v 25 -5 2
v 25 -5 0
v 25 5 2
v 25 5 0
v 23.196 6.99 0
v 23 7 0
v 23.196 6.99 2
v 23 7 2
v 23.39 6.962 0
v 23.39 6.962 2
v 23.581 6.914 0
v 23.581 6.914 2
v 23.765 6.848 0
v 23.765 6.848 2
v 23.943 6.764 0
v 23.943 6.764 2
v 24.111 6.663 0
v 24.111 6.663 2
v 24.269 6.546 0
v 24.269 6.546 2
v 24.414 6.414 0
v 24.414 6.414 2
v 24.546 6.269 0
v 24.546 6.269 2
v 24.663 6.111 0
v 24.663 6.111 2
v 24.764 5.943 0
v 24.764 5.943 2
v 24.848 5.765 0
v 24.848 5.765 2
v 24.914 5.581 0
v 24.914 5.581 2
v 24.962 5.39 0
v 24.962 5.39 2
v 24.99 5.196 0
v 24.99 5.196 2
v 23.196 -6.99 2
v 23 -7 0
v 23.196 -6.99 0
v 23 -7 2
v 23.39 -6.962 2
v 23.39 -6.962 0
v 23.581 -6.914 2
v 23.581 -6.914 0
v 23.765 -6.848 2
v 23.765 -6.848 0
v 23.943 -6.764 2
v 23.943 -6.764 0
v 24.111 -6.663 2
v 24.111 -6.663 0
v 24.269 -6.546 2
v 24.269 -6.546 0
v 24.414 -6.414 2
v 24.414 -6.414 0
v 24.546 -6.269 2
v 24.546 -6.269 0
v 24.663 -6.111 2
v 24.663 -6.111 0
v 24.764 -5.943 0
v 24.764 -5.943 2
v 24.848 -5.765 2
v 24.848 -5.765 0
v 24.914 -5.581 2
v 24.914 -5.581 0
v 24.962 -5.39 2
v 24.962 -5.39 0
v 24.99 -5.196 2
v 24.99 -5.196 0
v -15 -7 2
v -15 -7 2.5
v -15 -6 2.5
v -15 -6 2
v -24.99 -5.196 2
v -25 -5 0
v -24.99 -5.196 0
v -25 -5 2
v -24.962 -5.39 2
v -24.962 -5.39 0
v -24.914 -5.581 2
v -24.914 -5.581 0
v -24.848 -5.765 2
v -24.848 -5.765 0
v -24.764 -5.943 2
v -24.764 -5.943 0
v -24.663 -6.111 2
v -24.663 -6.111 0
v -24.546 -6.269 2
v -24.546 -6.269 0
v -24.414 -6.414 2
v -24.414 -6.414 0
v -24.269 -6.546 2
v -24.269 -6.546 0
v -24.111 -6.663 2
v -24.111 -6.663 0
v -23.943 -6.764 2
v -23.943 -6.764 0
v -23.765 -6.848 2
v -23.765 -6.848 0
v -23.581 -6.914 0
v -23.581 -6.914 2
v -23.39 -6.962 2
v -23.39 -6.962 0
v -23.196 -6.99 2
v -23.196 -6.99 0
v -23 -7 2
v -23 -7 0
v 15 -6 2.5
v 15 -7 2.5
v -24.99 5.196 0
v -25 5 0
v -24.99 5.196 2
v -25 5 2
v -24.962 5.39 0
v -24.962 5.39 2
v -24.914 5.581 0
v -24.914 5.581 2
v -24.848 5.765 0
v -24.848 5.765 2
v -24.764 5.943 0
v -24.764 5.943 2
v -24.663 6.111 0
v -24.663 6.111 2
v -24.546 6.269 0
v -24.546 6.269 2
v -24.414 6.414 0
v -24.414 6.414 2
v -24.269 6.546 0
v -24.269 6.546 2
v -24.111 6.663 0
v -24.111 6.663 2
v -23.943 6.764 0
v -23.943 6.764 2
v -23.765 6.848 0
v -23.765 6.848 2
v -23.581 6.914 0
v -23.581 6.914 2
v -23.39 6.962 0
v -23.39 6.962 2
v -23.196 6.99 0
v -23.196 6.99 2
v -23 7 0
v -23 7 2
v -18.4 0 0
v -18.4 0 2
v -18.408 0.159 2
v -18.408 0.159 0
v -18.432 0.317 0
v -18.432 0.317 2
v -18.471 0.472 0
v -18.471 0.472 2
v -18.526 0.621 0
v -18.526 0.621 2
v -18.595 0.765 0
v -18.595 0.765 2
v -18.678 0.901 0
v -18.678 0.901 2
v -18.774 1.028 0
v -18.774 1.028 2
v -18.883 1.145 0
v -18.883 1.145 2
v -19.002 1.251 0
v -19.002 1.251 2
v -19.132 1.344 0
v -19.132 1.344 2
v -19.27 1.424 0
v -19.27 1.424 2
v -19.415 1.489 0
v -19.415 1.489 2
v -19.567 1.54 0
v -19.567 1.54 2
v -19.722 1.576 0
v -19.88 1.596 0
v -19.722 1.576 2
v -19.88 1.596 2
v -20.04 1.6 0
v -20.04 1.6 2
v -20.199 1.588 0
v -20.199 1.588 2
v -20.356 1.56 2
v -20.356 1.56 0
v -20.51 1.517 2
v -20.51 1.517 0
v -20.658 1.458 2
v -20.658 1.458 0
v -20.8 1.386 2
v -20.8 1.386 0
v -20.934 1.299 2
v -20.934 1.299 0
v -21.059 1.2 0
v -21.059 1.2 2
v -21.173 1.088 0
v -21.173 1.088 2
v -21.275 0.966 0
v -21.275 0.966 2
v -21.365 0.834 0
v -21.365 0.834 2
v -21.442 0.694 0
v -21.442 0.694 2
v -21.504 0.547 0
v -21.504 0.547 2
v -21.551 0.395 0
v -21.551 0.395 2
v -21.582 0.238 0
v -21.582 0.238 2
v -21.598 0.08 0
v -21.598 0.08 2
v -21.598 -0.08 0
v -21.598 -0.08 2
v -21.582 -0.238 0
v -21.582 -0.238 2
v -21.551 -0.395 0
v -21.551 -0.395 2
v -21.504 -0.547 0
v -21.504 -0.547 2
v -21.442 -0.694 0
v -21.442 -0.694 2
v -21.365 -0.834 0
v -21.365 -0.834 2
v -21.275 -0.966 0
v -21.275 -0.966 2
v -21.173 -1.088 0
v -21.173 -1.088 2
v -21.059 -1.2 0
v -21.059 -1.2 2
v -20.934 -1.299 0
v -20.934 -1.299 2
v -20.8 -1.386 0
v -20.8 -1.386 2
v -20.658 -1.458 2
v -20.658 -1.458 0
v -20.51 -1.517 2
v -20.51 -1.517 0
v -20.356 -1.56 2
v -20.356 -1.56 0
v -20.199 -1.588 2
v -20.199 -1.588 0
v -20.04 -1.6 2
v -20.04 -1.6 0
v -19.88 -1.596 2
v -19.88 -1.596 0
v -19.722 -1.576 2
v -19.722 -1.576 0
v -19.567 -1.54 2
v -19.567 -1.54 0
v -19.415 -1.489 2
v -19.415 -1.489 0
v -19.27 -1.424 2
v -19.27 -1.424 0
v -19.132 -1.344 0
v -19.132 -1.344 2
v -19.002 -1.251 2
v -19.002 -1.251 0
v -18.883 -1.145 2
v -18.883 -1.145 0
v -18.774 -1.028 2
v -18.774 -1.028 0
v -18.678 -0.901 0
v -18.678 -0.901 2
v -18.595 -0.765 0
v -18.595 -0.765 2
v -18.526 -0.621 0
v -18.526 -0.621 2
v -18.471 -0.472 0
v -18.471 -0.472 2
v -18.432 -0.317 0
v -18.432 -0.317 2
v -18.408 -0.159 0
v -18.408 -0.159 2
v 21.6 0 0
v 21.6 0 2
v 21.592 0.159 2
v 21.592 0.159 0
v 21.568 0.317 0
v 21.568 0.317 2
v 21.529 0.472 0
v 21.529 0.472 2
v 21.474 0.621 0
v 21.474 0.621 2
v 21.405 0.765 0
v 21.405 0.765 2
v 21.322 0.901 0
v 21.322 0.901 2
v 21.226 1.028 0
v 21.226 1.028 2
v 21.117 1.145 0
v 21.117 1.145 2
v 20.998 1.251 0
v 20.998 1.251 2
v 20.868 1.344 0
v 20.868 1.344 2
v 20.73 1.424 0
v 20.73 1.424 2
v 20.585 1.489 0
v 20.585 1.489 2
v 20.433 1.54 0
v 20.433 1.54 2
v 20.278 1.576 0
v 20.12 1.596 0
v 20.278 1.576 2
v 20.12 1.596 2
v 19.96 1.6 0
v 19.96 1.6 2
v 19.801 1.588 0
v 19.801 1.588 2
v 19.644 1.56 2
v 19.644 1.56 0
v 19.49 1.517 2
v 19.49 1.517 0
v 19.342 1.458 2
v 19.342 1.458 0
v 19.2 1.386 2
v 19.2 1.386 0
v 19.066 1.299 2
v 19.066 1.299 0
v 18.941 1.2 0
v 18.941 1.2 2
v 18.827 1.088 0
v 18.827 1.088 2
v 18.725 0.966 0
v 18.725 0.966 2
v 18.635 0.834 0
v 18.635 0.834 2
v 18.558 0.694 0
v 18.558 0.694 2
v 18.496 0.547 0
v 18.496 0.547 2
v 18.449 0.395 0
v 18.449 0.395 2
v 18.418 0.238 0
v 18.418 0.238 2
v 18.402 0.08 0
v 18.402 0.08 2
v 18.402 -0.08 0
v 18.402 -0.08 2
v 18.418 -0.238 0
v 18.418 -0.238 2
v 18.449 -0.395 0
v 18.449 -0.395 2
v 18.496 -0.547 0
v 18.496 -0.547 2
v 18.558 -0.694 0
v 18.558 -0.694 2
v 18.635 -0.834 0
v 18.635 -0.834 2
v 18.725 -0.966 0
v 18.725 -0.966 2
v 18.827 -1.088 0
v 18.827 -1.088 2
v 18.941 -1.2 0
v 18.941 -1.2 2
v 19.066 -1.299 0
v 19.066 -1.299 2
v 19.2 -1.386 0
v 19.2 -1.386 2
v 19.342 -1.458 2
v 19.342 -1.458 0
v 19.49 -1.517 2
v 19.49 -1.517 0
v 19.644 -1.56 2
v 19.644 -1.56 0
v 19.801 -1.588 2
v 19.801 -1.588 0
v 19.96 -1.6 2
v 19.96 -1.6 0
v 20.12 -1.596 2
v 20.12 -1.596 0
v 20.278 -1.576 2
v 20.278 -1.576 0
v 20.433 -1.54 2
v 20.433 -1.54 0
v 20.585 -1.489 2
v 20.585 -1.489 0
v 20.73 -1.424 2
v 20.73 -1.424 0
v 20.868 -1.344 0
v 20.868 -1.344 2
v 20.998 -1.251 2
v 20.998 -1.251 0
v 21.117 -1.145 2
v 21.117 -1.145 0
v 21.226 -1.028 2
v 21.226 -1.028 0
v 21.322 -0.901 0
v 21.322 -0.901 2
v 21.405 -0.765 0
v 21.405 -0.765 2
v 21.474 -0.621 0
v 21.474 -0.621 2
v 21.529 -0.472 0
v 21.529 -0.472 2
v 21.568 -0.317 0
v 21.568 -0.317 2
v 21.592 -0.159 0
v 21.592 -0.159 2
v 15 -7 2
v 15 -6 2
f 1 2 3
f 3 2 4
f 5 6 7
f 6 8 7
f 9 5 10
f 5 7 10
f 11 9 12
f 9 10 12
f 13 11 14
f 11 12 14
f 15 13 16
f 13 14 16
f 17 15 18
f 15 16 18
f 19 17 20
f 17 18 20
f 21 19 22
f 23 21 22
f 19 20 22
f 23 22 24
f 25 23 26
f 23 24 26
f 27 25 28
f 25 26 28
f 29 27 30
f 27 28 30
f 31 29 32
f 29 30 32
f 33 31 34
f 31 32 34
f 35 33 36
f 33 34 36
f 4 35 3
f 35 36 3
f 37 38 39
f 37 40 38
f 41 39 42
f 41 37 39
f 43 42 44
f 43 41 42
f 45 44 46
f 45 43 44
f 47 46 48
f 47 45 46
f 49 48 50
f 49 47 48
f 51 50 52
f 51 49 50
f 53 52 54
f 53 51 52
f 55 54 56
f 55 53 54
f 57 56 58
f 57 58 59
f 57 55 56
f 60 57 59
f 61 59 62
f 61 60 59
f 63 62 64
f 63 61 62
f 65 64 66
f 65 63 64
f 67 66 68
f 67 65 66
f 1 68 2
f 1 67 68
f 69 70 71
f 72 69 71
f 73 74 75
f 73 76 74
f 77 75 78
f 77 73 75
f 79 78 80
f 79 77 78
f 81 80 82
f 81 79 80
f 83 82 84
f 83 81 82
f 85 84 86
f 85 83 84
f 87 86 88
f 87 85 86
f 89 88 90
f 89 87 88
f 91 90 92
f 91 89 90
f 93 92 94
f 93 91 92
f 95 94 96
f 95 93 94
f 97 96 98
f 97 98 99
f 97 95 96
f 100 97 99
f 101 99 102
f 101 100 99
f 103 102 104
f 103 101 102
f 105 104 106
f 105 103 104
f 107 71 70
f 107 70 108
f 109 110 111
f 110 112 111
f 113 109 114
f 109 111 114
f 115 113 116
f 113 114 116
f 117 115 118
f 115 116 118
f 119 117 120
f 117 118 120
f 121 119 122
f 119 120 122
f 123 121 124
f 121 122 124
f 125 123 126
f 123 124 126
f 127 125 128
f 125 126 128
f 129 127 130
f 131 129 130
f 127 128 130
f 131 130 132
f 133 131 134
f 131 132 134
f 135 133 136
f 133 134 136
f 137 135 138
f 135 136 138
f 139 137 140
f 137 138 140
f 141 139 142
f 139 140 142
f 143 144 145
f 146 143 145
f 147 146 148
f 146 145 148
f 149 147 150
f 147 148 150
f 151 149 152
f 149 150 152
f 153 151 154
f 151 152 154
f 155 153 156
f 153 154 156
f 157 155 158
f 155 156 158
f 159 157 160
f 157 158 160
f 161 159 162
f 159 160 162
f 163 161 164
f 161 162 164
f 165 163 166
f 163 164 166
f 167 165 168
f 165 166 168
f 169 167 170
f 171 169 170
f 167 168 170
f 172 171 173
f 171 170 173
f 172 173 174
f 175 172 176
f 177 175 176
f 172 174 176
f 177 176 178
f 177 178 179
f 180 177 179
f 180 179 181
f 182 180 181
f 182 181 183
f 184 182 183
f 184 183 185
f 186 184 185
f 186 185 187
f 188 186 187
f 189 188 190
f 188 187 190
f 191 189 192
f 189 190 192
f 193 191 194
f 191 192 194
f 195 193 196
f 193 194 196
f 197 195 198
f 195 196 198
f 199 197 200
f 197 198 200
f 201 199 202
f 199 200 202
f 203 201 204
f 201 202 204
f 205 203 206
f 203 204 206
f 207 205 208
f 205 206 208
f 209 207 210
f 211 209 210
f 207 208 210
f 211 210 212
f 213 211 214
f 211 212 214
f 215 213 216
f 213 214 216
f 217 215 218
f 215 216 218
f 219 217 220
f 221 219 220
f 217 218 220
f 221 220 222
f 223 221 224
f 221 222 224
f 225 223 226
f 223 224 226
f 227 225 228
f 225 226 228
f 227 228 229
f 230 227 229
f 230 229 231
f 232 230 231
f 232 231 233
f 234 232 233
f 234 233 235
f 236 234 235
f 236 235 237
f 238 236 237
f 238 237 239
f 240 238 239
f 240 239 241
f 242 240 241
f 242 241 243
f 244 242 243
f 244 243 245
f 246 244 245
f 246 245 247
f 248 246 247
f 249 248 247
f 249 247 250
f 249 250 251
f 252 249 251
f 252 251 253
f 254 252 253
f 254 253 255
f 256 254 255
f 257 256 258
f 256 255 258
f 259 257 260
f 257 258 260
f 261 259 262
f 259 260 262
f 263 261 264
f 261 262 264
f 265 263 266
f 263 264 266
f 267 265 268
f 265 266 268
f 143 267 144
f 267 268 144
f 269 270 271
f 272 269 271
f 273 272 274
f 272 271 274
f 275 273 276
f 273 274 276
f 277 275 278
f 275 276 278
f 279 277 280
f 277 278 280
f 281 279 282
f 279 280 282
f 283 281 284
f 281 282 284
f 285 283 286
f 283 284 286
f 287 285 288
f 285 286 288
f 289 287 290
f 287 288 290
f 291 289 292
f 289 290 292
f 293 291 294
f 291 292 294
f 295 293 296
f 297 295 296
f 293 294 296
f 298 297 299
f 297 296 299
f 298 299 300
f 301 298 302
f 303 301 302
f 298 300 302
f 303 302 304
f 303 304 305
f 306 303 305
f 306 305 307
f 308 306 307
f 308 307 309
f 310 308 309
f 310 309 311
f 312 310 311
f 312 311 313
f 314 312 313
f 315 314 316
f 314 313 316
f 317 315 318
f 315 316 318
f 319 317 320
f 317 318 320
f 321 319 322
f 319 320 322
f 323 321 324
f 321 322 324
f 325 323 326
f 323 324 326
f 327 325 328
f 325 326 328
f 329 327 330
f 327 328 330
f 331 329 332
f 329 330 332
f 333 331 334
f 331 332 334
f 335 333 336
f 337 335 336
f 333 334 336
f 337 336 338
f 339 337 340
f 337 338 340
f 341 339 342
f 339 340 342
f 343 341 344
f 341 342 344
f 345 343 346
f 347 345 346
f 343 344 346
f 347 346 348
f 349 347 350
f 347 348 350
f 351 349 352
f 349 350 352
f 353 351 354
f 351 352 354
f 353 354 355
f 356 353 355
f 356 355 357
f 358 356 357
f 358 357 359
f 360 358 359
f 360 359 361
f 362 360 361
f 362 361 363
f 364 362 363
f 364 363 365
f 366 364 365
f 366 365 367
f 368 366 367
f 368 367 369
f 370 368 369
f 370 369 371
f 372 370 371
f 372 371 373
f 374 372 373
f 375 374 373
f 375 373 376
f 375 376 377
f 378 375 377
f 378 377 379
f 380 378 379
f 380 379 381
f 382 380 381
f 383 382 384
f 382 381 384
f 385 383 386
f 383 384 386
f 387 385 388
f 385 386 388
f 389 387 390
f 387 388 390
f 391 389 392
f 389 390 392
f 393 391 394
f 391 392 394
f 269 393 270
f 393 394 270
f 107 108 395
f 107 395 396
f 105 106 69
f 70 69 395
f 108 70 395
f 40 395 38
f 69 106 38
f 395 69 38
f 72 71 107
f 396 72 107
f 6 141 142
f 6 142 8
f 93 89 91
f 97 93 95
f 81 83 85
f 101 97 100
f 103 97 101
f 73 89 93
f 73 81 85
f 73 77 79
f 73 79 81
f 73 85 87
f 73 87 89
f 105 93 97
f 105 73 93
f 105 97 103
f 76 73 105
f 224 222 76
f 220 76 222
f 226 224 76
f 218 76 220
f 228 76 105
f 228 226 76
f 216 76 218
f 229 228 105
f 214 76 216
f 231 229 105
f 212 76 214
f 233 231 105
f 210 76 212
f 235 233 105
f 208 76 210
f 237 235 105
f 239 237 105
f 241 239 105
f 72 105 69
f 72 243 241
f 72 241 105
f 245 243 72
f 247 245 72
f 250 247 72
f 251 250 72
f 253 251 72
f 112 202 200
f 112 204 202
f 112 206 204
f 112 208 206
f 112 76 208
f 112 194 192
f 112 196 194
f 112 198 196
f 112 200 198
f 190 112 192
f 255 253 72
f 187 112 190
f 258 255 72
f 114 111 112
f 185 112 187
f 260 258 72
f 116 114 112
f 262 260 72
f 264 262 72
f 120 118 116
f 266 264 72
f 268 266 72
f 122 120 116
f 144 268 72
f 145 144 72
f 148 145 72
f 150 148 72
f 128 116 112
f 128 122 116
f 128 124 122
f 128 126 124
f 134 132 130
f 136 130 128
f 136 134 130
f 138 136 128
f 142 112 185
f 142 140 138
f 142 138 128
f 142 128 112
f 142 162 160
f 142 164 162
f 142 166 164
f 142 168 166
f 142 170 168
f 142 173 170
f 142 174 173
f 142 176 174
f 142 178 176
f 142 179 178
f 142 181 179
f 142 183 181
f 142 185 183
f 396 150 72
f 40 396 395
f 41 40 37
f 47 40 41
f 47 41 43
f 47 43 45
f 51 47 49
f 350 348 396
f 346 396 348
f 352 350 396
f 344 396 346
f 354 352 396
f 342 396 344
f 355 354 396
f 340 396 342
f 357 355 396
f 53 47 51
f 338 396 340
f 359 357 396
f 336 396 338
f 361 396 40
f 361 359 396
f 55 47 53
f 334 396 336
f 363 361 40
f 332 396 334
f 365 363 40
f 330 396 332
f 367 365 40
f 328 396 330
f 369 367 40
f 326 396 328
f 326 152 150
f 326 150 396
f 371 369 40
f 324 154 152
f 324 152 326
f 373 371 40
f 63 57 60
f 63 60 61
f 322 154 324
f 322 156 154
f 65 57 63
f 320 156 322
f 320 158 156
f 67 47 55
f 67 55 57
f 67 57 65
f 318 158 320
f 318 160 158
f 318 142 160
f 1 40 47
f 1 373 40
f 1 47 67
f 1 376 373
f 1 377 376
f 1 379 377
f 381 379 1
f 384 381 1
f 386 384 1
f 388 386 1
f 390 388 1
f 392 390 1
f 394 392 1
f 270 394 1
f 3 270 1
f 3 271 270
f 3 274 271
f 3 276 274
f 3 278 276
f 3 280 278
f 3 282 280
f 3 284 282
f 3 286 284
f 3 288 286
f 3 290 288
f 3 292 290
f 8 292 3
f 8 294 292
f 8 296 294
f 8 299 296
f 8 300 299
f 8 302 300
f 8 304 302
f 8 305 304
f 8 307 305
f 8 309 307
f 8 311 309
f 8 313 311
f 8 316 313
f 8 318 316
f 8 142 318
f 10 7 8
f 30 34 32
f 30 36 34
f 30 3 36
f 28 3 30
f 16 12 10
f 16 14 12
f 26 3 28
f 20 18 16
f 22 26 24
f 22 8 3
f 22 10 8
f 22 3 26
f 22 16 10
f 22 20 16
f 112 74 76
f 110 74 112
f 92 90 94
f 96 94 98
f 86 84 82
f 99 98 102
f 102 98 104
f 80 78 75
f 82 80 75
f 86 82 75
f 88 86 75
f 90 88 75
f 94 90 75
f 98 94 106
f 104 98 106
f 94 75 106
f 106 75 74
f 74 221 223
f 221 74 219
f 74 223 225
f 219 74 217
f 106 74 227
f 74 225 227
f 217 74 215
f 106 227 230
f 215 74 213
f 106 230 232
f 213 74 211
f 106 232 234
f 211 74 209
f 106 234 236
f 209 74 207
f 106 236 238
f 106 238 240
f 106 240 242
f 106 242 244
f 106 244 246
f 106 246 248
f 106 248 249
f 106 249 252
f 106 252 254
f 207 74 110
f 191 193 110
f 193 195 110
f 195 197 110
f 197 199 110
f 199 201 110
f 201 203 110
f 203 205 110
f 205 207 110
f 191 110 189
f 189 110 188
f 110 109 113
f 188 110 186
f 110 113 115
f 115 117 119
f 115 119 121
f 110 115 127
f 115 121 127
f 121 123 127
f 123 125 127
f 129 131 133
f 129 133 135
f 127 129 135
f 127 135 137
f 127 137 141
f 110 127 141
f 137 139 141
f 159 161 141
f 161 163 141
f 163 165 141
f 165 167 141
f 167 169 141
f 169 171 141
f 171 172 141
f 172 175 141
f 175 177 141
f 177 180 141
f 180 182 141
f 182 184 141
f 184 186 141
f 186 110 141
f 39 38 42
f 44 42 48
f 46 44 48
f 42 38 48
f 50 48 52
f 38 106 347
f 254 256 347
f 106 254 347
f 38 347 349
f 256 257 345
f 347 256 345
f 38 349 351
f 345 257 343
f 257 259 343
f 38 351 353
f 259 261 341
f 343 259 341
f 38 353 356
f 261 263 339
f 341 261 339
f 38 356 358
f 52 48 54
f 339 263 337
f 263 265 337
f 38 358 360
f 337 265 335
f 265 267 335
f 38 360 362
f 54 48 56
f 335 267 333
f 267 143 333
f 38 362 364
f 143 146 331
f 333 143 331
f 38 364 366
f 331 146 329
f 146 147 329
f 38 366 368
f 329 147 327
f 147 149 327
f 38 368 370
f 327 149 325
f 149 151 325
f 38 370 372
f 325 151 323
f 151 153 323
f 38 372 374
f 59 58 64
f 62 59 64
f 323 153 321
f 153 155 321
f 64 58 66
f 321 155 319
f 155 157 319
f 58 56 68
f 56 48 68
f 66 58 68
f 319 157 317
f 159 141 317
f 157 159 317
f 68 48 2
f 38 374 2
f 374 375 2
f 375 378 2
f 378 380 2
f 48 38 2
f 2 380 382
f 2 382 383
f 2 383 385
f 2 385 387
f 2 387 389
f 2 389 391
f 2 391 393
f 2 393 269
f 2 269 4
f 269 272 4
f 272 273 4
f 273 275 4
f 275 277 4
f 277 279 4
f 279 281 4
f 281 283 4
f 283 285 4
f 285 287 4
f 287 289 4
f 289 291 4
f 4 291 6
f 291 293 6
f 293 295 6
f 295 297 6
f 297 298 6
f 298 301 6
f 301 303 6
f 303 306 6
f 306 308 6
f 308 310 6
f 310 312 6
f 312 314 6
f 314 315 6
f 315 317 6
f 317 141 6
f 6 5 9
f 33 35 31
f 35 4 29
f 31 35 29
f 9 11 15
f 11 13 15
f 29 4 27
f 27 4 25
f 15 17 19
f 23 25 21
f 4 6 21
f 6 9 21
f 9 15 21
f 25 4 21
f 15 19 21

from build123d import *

# Parameters (mm, degrees)
SKETCH2_W           = 50
SKETCH2_H           = 14
BOSS_EXTRUDE1_DEPTH = 2.5
SKETCH4_OUTSIDE_W   = 62.396
SKETCH4_OUTSIDE_H   = 26.396
SKETCH4_OUTSIDE_W_2 = 30
SKETCH4_OUTSIDE_H_2 = 1
CUT_EXTRUDE1_DEPTH  = 0.5
SKETCH5_R           = 1.6
CUT_EXTRUDE2_DEPTH  = 2
FILLET2_R           = 2


with BuildPart() as part:
    # Sketch2 → Boss-Extrude1 (new body)
    with BuildSketch(Plane.XY):
        Rectangle(SKETCH2_W, SKETCH2_H)
    extrude(amount=BOSS_EXTRUDE1_DEPTH)

    # Sketch4 outside → Cut-Extrude1 (cut)
    with BuildSketch(Plane.XY.offset(2.5)):
        Rectangle(SKETCH4_OUTSIDE_W, SKETCH4_OUTSIDE_H)
        with Locations((0, -6.5)):
            Rectangle(SKETCH4_OUTSIDE_W_2, SKETCH4_OUTSIDE_H_2, mode=Mode.SUBTRACT)
    extrude(amount=-CUT_EXTRUDE1_DEPTH, mode=Mode.SUBTRACT)

    # Sketch5 → Cut-Extrude2 (cut)
    with BuildSketch(Plane.XY.offset(2)):
        with Locations((-20, 0)):
            Circle(SKETCH5_R)
        with Locations((20, 0)):
            Circle(SKETCH5_R)
    extrude(amount=-CUT_EXTRUDE2_DEPTH, mode=Mode.SUBTRACT)

    # Fillet2
    fillet2_edges = [part.edges().sort_by_distance(p)[0] for p in [
        (25, -7, 1),
        (-25, -7, 1),
        (-25, 7, 1),
        (25, 7, 1),
    ]]
    fillet(fillet2_edges, radius=FILLET2_R)


solid = part.part
